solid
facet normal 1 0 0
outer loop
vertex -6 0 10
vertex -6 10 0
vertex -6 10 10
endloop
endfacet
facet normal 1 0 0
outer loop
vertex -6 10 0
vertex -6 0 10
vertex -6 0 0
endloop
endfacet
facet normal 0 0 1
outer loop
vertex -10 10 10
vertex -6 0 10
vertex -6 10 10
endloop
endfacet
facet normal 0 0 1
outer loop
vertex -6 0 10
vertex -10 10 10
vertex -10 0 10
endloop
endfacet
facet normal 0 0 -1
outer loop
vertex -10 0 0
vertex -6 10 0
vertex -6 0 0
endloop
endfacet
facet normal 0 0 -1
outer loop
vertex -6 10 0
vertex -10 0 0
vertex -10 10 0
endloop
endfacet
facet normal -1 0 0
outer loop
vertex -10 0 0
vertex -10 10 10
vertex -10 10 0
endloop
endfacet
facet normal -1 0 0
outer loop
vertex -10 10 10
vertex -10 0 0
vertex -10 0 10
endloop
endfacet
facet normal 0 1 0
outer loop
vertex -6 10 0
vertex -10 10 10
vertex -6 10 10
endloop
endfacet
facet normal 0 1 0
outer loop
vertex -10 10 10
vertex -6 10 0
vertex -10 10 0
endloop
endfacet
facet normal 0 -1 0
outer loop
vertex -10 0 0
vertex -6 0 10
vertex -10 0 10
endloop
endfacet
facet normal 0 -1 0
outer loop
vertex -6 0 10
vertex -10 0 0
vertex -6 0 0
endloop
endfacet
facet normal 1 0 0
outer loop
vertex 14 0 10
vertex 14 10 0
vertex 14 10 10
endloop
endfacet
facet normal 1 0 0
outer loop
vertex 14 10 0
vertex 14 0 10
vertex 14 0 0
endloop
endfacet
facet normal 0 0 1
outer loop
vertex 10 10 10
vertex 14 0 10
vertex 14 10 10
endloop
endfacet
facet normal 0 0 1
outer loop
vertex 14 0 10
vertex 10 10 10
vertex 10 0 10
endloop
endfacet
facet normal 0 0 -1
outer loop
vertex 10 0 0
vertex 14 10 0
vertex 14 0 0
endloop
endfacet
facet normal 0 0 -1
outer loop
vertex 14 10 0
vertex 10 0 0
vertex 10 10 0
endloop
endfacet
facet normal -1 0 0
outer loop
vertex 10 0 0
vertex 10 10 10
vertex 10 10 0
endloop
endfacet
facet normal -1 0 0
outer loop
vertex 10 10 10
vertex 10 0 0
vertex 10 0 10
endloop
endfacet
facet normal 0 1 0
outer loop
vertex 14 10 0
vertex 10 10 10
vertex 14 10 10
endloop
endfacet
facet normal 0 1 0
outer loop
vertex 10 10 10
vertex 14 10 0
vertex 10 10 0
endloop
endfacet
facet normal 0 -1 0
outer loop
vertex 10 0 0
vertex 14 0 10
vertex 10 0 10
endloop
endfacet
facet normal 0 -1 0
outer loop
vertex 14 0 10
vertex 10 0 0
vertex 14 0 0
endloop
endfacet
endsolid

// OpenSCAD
// Ooze test
translate([-10.0,0,0]) cube(size=[4,10,10], center=false);
translate([10.0,0,0]) cube(size=[4,10,10], center=false);
